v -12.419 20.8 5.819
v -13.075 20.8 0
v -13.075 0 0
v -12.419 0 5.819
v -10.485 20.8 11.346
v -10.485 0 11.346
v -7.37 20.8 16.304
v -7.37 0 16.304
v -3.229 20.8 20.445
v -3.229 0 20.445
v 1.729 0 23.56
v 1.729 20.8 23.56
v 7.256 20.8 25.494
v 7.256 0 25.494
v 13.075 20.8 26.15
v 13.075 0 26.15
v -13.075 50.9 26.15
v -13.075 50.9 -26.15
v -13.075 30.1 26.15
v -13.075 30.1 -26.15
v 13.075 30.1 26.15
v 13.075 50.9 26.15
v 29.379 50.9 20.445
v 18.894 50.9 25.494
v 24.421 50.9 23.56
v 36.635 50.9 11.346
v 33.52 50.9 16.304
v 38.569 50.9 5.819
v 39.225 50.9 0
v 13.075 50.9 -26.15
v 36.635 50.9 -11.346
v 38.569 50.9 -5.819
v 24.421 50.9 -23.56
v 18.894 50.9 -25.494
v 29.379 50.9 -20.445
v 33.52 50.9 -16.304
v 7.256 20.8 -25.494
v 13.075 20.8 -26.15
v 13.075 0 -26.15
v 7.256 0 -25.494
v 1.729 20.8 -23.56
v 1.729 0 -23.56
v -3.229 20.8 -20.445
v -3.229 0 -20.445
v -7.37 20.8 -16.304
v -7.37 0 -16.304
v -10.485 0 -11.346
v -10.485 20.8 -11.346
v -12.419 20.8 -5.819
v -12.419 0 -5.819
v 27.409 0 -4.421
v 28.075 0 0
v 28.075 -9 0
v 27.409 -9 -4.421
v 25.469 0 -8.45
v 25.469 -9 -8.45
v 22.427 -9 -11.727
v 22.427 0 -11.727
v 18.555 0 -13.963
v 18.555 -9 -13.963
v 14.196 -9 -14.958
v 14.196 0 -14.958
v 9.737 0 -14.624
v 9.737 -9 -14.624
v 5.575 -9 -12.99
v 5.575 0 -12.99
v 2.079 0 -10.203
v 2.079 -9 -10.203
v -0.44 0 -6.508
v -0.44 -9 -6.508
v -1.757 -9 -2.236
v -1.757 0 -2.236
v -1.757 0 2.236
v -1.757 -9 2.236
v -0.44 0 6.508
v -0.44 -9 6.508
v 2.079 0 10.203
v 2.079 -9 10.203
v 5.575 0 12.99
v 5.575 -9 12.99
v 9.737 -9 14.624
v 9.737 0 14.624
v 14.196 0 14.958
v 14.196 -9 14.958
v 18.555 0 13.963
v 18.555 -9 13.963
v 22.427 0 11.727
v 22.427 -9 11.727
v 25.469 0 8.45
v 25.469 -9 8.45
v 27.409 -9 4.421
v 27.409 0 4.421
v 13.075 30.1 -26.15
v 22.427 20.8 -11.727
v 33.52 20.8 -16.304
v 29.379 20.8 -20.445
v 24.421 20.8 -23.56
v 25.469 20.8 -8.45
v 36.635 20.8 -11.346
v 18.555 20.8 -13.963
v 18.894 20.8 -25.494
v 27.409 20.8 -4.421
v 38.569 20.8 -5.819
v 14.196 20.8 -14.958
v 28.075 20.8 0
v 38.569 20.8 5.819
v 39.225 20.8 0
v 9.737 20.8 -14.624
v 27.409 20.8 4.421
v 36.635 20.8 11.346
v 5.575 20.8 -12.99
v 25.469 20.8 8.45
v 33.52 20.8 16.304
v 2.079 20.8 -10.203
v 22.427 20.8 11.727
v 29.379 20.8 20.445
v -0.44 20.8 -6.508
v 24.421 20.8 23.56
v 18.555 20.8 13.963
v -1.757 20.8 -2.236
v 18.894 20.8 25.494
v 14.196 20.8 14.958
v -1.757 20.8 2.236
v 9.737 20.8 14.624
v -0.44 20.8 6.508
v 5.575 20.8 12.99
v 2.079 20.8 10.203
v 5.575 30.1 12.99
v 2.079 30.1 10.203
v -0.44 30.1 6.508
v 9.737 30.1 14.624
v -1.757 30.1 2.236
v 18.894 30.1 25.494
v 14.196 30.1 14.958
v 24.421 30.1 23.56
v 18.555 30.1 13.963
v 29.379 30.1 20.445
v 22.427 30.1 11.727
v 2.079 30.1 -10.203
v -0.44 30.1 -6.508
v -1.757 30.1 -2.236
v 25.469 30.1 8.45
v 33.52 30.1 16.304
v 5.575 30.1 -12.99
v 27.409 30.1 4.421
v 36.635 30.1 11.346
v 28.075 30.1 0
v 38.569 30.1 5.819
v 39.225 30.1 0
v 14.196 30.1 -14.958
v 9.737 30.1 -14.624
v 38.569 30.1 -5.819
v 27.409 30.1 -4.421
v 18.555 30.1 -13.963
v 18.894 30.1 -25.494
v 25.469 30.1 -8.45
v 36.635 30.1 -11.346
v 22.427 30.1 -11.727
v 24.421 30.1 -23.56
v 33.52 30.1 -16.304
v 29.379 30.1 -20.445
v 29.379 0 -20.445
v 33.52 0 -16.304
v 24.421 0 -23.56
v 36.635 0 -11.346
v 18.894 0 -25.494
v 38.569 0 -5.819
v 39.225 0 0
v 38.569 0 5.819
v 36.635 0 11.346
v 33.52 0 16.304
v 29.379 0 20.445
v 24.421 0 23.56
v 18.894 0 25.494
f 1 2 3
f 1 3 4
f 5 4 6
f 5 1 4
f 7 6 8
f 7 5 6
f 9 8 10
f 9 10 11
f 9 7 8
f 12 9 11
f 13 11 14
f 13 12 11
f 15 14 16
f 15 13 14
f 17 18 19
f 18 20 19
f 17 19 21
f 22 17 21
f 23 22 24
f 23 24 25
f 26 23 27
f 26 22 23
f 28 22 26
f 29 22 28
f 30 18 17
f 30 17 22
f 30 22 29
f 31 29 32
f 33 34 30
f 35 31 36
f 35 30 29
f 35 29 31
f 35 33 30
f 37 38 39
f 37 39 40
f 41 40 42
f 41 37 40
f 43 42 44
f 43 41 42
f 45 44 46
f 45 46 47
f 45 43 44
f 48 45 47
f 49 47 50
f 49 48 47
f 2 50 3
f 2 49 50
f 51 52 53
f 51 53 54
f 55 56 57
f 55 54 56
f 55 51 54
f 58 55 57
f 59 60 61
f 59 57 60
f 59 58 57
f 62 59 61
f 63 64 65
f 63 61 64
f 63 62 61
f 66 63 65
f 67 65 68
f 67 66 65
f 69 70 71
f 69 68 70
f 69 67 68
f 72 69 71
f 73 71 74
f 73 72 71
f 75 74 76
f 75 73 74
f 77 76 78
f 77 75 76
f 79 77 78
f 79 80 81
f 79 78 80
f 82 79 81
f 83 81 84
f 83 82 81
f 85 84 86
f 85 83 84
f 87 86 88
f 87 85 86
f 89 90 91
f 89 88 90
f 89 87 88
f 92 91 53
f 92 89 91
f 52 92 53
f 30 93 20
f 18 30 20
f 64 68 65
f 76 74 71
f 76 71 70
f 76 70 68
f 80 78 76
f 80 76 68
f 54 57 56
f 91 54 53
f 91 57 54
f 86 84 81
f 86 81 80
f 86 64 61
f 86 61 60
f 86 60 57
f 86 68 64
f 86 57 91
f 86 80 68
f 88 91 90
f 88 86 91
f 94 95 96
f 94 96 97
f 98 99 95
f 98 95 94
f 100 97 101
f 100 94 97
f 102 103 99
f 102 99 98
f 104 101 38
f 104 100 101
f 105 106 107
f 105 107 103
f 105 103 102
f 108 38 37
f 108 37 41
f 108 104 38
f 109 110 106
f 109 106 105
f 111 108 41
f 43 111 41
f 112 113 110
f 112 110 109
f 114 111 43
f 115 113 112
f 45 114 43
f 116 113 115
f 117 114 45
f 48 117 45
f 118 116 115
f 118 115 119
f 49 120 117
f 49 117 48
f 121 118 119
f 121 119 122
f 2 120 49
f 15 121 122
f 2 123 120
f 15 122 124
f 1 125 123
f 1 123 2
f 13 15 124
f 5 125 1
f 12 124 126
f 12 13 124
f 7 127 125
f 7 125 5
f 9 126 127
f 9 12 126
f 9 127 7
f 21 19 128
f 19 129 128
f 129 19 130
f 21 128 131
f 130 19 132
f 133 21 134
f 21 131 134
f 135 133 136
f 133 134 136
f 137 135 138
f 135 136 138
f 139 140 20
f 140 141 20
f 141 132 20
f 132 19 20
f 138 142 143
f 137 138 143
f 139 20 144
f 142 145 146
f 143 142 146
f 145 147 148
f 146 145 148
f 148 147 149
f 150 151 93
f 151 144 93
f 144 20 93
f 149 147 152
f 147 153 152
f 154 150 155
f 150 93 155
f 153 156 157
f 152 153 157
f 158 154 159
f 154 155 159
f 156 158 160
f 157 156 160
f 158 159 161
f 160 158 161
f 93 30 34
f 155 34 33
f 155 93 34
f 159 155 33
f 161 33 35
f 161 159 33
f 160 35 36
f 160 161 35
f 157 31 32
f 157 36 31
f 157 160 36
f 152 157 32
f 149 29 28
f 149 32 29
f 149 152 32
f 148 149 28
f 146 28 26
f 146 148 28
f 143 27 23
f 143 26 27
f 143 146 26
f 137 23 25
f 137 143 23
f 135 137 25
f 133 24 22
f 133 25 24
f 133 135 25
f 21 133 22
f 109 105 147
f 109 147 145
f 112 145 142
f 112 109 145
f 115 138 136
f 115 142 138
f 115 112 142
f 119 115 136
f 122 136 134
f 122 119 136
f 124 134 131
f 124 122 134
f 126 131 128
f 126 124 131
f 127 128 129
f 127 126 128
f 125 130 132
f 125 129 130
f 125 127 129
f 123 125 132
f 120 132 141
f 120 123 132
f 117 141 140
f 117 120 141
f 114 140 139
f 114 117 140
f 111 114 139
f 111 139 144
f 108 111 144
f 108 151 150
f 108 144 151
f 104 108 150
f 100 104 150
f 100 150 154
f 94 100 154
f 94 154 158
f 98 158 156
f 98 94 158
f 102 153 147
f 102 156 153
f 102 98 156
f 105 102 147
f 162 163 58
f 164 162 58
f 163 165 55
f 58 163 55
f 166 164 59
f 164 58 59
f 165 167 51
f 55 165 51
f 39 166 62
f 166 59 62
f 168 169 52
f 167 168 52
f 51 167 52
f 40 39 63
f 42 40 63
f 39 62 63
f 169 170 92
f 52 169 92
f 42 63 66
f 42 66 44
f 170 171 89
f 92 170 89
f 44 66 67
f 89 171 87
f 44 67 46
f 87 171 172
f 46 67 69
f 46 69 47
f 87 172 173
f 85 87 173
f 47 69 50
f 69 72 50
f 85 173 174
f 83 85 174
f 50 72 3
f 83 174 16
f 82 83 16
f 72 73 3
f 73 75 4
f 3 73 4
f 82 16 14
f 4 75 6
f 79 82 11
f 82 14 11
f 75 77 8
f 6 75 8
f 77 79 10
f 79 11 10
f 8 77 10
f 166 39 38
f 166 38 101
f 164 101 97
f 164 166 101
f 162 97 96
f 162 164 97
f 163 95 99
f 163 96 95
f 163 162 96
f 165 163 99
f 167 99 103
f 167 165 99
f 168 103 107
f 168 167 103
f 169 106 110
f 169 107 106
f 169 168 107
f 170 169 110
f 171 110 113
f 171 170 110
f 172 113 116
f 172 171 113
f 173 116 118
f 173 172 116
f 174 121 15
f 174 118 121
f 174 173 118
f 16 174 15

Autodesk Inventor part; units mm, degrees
ref_plane "XZ Plane" through (0, 0, 0) normal (0, 1, 0) x (-1, 0, 0)
ref_plane "XY Plane" through (0, 0, 0) normal (0, 0, 1) x (1, 0, 0)
sketch "Sketch1" plane through (0, 0, 0) normal (0, 1, 0) x (-1, 0, 0)
  line L0 (13.075, -26.15) -> (-13.075, -26.15)
  line L1 (-13.075, -26.15) -> (-13.075, 26.15)
  line L2 (-13.075, 26.15) -> (13.075, 26.15)
  line L3 (13.075, 26.15) -> (13.075, -26.15)
  arc A0 (-13.075, 26.15) -> (-13.075, -26.15) centre (-13.075, 0) ccw
  circle A1 centre (-13.075, 0) radius 26.15
  point P0 (0, 0)
  point P1 (0, -26.15)
  dimension "d0" = 26.15
extrude "Extrusion1" add sketch "Sketch1" along normal blind 20.8
sketch "Sketch2" plane through (0, 20.8, 0) normal (0, 1, 0) x (1, 0, 0)
  circle A0 centre (13.075, 0) radius 15
  arc A1 (13.075, -26.15) -> (13.075, 26.15) centre (13.075, 0) ccw projected
  point P0 (0, 0)
  dimension "d3" = 30
extrude "Extrusion2" add sketch "Sketch2" along normal blind 9.3
sketch "Sketch3" plane through (0, 0, 0) normal (0, -1, 0) x (1, 0, 0)
  circle A0 centre (13.075, 0) radius 15
  arc A1 (13.075, -26.15) -> (13.075, 26.15) centre (13.075, 0) ccw projected
  point P0 (0, 0)
  dimension "d6" = 30
extrude "Extrusion3" add sketch "Sketch3" along normal blind 9
sketch "Sketch4" plane through (13.075, 30.1, 0) normal (0, 1, 0) x (1, 0, 0)
  line L0 (-26.15, 26.15) -> (-26.15, -26.15) projected
  line L1 (-26.15, -26.15) -> (-26.15, 26.15)
  line L2 (0, 26.15) -> (-26.15, 26.15) projected
  line L3 (-26.15, 26.15) -> (0, 26.15)
  arc A0 (0, -26.15) -> (0, 26.15) centre (0, 0) ccw projected
  arc A1 (0, -26.15) -> (0, 26.15) centre (0, 0) ccw
  line L4 (-26.15, -26.15) -> (0, -26.15) projected
  line L5 (0, -26.15) -> (-26.15, -26.15)
  point P0 (-13.075, 0)
extrude "Extrusion4" add sketch "Sketch4" along normal blind 20.8
fillet "Fillet1" radius 26.15 2 edges at (-13.075, 10.4, -26.15) (-13.075, 10.4, 26.15)
properties part number "Table Hinge"
